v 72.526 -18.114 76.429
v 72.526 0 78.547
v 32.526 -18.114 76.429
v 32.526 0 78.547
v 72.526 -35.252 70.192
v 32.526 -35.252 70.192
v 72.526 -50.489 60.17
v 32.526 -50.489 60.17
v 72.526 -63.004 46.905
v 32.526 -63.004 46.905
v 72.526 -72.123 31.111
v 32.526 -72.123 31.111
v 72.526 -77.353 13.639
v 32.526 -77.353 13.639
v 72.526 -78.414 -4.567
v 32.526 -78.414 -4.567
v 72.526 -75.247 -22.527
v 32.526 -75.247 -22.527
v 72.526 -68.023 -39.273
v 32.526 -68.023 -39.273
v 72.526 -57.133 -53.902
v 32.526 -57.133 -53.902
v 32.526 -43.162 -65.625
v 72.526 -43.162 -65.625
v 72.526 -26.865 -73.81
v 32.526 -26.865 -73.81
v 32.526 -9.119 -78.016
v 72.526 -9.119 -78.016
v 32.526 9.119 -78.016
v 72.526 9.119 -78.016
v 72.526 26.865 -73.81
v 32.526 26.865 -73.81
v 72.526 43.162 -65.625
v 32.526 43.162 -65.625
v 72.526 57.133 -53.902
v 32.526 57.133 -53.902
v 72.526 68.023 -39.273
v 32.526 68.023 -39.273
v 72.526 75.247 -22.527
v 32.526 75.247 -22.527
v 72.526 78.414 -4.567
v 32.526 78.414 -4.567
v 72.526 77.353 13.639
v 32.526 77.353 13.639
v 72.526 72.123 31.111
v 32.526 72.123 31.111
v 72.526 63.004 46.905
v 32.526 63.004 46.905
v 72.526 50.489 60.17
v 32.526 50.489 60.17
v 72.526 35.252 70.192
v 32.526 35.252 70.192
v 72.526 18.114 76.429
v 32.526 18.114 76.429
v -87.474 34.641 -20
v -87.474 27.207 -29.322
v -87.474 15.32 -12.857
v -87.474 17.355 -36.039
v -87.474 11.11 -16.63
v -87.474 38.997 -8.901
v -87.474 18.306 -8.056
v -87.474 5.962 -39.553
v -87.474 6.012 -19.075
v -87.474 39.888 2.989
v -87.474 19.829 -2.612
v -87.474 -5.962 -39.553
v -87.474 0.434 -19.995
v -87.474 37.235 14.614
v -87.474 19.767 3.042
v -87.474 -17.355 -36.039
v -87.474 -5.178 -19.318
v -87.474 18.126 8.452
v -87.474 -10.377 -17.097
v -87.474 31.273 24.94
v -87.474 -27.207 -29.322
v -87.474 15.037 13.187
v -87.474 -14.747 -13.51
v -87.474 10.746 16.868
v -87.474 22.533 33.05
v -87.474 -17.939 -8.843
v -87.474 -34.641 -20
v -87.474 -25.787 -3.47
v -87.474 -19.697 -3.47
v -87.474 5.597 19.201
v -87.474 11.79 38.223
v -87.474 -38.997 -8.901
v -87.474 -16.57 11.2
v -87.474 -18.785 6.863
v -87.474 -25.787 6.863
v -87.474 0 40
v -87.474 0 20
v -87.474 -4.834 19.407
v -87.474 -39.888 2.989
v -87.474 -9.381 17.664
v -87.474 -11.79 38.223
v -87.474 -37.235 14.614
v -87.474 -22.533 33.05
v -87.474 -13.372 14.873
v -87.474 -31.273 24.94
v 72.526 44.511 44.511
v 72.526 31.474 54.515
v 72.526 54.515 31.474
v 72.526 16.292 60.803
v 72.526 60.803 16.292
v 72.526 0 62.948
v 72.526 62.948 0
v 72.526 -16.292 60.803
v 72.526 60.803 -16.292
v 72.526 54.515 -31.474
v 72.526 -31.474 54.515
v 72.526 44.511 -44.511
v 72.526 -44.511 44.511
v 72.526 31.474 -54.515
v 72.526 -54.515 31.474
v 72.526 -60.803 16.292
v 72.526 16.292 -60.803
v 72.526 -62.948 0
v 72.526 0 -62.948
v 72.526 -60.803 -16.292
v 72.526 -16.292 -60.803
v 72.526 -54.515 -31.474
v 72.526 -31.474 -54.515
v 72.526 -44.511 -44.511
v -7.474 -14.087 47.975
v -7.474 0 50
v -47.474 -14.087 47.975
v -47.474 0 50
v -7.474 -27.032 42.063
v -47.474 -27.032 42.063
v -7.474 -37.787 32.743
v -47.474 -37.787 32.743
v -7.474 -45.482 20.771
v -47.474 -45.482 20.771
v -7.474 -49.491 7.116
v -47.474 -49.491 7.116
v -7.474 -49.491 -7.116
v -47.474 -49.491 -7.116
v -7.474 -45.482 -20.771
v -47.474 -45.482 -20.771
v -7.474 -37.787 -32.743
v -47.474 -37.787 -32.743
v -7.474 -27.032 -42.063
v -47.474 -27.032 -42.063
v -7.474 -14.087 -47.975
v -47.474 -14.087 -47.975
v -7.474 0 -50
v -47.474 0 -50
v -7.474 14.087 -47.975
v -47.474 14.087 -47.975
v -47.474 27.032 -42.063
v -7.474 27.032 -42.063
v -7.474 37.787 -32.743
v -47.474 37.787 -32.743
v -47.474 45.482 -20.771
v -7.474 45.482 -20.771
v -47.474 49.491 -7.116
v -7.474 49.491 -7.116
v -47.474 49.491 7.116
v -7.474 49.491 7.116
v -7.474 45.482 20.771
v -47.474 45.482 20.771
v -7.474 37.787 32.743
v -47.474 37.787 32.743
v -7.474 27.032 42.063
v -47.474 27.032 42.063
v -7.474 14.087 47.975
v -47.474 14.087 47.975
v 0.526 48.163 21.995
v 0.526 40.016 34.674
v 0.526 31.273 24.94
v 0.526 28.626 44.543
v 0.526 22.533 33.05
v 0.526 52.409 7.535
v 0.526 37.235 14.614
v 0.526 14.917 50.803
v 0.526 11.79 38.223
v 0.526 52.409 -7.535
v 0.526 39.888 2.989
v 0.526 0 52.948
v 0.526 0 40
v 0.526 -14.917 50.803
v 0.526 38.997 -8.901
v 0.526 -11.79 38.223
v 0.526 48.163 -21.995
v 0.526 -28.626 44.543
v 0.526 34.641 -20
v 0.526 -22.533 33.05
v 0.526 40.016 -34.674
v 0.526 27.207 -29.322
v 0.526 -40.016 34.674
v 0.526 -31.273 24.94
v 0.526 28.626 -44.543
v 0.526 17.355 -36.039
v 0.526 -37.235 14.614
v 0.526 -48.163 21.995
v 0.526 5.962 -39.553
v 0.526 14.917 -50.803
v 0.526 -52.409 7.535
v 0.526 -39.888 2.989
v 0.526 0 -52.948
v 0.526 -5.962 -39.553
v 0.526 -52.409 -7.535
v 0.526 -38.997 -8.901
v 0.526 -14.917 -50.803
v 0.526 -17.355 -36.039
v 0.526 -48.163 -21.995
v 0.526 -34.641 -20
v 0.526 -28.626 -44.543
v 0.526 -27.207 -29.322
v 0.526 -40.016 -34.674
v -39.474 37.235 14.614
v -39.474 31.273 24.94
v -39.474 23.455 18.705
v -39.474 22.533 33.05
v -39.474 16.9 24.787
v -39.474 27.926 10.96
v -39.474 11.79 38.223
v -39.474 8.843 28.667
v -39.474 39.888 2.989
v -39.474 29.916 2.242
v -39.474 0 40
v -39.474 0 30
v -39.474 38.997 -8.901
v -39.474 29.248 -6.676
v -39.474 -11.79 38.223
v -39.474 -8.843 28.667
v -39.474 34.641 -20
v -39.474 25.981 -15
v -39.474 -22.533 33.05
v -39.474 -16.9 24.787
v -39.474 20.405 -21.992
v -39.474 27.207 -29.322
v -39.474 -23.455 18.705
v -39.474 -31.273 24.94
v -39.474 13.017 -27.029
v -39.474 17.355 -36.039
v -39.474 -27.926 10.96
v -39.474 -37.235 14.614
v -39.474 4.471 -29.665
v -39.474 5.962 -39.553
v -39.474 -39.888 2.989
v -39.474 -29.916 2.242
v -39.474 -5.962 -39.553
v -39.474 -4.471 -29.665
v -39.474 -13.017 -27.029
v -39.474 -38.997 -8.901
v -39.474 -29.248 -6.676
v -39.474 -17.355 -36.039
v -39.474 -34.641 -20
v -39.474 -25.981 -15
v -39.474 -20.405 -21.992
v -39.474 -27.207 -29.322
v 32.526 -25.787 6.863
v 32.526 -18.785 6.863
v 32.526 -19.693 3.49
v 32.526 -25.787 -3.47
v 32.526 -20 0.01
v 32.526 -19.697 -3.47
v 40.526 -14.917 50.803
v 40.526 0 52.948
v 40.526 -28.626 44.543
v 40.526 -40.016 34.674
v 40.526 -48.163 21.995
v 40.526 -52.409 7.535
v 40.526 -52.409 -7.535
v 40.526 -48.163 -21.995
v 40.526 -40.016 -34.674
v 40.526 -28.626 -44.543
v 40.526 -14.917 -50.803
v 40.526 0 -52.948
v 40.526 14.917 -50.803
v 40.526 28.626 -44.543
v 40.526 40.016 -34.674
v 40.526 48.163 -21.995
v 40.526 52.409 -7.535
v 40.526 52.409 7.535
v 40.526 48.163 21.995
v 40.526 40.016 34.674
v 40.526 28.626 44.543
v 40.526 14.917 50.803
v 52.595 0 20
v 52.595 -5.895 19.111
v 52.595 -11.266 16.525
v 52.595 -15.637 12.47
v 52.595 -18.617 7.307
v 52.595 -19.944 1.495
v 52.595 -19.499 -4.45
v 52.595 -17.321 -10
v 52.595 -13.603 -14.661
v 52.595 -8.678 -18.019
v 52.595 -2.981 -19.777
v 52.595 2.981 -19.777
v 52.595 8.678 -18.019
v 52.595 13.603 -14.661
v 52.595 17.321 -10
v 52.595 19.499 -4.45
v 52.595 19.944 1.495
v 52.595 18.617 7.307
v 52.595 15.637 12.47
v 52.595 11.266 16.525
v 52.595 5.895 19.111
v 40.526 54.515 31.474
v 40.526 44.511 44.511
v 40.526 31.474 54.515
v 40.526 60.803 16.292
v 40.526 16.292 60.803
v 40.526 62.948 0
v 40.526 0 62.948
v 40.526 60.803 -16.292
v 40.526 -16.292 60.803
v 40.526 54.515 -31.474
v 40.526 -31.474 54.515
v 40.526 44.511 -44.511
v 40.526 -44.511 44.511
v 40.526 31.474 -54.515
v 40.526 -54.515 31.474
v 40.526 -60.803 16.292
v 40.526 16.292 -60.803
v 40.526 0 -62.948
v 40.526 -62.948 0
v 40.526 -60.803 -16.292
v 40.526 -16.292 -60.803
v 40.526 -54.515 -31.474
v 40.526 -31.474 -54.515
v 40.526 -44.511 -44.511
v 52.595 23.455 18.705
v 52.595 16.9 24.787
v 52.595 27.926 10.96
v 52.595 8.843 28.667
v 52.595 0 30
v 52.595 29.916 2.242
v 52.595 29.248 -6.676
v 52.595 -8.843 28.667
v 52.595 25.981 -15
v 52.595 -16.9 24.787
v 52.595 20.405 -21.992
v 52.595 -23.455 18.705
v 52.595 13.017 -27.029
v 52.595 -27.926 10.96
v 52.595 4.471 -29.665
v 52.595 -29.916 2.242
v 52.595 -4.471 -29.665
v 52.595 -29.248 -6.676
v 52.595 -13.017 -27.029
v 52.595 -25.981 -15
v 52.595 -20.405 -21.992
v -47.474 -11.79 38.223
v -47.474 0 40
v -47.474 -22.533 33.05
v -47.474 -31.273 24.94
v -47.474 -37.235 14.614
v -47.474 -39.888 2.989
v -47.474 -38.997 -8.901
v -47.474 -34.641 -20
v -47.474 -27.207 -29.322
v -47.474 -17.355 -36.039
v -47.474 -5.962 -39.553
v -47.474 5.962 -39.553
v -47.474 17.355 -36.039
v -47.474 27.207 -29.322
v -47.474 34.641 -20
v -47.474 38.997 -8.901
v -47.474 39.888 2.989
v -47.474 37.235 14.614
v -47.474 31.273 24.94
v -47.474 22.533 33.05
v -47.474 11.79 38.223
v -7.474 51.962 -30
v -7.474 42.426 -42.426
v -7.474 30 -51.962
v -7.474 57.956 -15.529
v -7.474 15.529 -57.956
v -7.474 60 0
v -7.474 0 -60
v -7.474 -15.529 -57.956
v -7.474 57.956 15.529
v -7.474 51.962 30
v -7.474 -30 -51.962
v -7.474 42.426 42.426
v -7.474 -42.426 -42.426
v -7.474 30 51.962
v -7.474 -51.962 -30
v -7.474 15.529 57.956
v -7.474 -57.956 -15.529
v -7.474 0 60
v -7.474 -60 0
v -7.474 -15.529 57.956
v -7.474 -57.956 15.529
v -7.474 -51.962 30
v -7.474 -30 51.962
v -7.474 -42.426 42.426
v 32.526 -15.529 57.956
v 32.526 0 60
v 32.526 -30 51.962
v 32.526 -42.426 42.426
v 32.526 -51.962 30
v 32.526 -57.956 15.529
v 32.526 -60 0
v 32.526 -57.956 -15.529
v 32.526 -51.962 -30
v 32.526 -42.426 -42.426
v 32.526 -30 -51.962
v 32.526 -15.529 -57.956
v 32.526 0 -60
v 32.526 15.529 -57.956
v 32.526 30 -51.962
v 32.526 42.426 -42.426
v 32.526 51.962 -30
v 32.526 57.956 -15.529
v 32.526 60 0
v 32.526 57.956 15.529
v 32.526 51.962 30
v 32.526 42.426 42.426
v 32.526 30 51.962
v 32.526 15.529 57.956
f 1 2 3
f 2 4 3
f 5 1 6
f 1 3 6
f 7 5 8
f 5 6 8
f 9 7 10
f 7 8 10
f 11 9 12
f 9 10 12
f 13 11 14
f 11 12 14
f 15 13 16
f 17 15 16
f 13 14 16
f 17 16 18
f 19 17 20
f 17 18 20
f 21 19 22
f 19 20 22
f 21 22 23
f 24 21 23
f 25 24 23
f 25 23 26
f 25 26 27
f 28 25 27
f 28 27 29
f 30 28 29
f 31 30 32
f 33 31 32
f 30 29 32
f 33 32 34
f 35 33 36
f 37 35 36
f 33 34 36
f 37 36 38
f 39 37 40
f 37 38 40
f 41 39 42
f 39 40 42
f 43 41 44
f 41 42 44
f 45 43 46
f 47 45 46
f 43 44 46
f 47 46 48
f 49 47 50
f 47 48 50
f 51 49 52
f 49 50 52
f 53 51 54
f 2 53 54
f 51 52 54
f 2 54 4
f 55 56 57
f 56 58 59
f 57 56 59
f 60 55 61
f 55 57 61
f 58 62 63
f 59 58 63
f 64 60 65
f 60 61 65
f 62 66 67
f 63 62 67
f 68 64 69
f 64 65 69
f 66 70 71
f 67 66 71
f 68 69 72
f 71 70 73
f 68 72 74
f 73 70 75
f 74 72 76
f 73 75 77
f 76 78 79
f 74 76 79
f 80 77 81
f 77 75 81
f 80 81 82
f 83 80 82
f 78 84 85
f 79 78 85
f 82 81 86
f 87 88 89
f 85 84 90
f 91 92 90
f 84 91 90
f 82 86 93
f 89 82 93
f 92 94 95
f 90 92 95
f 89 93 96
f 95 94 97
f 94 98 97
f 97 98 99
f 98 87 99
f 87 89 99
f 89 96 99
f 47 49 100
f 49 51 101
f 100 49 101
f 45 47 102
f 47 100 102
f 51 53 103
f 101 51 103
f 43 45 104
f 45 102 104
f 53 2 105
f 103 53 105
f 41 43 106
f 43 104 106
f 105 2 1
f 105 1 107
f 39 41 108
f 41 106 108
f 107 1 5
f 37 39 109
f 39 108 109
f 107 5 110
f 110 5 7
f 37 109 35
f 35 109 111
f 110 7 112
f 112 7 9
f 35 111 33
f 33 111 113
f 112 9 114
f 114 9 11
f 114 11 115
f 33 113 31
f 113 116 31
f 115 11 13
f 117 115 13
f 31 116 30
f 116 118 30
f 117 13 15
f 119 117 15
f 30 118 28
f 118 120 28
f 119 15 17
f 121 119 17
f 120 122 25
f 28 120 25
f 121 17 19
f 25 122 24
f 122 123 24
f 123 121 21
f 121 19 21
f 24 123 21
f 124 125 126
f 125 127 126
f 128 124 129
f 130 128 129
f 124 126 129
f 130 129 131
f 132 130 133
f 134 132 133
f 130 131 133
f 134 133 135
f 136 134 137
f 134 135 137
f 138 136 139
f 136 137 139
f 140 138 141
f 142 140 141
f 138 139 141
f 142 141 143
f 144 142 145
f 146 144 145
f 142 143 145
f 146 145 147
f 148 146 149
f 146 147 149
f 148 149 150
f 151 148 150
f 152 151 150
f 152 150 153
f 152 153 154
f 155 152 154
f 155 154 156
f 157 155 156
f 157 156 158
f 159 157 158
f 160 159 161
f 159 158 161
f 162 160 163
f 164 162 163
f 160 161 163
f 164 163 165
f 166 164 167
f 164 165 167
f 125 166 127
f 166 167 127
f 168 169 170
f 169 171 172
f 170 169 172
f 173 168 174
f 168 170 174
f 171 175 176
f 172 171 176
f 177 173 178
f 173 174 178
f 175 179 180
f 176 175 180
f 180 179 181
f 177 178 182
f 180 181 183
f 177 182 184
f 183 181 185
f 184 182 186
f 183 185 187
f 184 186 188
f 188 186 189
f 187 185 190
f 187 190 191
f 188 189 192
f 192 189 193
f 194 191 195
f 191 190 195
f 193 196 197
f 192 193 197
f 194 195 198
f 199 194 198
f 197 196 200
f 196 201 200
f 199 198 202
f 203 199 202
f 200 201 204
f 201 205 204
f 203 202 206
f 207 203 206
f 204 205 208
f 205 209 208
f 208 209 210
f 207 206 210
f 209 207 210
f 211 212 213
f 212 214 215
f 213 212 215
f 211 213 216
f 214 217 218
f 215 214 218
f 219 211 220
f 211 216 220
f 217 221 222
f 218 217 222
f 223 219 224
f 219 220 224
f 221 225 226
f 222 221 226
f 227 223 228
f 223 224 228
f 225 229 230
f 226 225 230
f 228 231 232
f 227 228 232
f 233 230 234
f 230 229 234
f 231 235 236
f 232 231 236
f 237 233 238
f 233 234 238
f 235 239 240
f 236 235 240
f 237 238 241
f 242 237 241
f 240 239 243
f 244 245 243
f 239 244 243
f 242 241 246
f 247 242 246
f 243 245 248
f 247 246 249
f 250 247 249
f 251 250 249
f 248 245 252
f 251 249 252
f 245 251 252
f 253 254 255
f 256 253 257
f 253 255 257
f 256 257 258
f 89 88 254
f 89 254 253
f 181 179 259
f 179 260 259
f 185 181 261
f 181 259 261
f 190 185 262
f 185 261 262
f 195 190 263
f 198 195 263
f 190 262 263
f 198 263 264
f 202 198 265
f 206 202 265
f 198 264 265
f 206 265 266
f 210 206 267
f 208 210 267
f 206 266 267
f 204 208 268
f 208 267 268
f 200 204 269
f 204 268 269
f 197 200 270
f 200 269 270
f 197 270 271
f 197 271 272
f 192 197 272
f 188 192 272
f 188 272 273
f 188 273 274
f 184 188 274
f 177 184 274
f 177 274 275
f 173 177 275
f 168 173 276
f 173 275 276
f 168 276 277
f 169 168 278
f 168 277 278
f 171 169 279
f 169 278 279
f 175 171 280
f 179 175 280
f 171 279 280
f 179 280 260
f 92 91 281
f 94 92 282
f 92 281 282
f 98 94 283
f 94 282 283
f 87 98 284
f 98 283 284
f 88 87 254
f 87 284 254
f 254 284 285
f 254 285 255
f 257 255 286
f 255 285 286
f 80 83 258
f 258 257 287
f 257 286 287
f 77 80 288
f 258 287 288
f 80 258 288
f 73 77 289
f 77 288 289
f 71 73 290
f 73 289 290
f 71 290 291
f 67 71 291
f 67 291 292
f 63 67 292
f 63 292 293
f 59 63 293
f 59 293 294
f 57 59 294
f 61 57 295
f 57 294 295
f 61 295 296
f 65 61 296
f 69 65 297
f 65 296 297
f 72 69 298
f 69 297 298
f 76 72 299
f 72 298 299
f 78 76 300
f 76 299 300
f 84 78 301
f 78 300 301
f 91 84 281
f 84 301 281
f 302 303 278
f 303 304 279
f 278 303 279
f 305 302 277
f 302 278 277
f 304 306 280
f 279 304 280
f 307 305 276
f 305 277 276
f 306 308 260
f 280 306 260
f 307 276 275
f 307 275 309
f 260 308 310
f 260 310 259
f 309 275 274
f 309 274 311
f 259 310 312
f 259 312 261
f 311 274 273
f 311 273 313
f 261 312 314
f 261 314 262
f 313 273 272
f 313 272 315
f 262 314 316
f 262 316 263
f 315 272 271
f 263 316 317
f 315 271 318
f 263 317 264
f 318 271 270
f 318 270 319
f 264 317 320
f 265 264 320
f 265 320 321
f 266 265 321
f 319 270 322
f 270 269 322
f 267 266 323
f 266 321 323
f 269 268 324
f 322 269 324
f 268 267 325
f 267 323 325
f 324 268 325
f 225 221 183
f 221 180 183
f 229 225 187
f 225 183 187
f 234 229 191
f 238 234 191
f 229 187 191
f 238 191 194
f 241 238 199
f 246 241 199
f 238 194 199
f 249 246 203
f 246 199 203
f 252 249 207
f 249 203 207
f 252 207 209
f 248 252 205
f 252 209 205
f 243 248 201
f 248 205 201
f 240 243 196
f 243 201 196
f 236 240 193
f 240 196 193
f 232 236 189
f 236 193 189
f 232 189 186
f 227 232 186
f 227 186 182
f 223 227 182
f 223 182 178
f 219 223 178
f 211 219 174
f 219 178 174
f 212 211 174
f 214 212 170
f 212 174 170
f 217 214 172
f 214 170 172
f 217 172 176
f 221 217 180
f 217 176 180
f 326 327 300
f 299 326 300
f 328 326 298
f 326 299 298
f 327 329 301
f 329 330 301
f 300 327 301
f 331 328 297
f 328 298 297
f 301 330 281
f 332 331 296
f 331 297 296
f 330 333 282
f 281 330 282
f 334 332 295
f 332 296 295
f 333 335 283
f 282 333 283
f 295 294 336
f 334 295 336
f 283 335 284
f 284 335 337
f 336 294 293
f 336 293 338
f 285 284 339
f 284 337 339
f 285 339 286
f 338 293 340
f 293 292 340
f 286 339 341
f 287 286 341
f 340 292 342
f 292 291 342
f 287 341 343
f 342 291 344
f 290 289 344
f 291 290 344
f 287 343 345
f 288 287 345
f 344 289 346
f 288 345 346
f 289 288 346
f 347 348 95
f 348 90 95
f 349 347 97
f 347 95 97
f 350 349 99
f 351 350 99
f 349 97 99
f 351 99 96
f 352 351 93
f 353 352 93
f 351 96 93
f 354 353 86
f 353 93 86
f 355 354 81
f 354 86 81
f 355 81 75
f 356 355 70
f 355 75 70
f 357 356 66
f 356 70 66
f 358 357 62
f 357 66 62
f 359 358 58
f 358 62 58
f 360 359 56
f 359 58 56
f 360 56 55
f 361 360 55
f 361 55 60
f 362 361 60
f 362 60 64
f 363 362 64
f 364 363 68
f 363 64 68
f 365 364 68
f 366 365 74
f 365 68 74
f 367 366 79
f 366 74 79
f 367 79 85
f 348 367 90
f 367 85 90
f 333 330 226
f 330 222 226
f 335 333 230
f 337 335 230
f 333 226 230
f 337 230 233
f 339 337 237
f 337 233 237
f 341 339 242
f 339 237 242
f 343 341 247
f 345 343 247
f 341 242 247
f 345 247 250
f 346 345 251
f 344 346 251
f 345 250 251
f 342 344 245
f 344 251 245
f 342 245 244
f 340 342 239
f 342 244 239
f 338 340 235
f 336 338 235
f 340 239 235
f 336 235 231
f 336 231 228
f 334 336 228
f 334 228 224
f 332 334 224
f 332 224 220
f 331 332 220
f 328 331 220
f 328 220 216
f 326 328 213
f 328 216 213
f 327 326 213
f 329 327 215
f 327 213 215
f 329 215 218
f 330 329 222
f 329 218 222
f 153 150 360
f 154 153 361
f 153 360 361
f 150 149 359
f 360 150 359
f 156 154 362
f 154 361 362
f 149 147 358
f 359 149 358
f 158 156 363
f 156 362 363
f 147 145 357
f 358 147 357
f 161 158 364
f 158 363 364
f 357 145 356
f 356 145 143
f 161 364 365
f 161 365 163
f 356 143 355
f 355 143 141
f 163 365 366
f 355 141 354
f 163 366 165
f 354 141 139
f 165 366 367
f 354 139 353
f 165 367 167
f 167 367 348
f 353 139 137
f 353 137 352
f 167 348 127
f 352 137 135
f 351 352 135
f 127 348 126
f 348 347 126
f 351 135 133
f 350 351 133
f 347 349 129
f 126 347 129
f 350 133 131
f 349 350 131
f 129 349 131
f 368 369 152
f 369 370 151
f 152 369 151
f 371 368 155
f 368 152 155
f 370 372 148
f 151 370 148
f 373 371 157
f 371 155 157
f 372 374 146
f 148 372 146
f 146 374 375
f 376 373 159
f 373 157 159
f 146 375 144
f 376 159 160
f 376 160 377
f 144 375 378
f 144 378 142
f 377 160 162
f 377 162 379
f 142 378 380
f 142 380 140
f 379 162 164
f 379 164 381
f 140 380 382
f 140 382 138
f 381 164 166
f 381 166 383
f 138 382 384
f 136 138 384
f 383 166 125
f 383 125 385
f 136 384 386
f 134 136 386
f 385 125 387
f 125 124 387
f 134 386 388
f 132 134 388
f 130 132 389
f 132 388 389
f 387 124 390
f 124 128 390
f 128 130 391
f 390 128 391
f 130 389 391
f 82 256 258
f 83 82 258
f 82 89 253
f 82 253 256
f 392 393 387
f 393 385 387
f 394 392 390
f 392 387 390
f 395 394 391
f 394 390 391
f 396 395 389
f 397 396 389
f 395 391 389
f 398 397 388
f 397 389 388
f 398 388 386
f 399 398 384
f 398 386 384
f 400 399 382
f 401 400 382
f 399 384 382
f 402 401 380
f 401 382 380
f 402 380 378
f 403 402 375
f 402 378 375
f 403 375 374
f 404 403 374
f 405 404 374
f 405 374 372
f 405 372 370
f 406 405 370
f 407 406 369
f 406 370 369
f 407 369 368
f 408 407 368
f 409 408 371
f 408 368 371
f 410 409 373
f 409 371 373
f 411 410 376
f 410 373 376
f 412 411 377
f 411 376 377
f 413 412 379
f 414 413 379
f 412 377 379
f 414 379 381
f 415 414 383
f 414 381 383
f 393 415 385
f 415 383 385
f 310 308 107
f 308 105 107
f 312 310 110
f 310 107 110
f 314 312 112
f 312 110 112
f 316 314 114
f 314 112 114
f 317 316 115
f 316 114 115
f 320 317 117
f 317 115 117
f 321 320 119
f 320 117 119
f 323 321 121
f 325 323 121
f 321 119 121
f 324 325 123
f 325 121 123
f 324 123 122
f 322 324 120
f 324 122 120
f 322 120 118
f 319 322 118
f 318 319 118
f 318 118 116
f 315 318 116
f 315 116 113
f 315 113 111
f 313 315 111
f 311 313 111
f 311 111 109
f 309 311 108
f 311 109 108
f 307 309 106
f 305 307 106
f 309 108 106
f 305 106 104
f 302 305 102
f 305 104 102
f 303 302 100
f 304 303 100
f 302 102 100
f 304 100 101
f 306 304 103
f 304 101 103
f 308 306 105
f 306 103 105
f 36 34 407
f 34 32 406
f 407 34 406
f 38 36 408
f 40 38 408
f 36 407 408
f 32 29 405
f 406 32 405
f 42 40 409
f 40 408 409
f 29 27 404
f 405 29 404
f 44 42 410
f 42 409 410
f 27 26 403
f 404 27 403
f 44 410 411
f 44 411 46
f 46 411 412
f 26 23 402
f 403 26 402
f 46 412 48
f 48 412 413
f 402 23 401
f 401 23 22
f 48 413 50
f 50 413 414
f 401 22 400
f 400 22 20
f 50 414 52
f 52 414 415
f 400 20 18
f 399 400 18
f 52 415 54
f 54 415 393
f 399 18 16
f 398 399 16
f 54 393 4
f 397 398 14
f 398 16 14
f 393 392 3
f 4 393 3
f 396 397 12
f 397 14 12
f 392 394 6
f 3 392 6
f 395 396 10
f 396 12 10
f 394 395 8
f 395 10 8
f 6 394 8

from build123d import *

# Parameters (mm, degrees)
CUT_EXTRUDE2_DEPTH = 120


with BuildPart() as part:
    # Sketch1 → Revolve1 (revolve)
    with BuildSketch(Plane(origin=(0, 0, 0), x_dir=(1, 0, 0), z_dir=(0, 1, 0)), mode=Mode.PRIVATE) as revolve1_sk:
        Polygon((-87.474048443, 20), (52.595155709, 20), (52.595155709, 30), (-39.474048443, 30), (-39.474048443, 40), (0.525951557, 40), (0.525951557, 52.948096886), (40.525951557, 52.948096886), (40.525951557, 62.948096886), (72.525951557, 62.948096886), (72.525951557, 78.546712803), (32.525951557, 78.546712803), (32.525951557, 60), (-7.474048443, 60), (-7.474048443, 50), (-47.474048443, 50), (-47.474048443, 40), (-87.474048443, 40), align=None)
    revolve(revolve1_sk.sketch.rotate(Axis((-87.474048443, 0, 0), (1, 0, 0)), 180), axis=Axis((-87.474048443, 0, 0), (1, 0, 0)))

    # Sketch2 → Cut-Extrude2 (cut)
    with BuildSketch(Plane.ZY.offset(87.474048443)):
        Polygon((-3.470245106, -25.786795459), (-3.470245106, -19.696634202), (6.863316134, -18.785496843), (6.863316134, -25.786795459), align=None)
    extrude(amount=-CUT_EXTRUDE2_DEPTH, mode=Mode.SUBTRACT)


solid = part.part
